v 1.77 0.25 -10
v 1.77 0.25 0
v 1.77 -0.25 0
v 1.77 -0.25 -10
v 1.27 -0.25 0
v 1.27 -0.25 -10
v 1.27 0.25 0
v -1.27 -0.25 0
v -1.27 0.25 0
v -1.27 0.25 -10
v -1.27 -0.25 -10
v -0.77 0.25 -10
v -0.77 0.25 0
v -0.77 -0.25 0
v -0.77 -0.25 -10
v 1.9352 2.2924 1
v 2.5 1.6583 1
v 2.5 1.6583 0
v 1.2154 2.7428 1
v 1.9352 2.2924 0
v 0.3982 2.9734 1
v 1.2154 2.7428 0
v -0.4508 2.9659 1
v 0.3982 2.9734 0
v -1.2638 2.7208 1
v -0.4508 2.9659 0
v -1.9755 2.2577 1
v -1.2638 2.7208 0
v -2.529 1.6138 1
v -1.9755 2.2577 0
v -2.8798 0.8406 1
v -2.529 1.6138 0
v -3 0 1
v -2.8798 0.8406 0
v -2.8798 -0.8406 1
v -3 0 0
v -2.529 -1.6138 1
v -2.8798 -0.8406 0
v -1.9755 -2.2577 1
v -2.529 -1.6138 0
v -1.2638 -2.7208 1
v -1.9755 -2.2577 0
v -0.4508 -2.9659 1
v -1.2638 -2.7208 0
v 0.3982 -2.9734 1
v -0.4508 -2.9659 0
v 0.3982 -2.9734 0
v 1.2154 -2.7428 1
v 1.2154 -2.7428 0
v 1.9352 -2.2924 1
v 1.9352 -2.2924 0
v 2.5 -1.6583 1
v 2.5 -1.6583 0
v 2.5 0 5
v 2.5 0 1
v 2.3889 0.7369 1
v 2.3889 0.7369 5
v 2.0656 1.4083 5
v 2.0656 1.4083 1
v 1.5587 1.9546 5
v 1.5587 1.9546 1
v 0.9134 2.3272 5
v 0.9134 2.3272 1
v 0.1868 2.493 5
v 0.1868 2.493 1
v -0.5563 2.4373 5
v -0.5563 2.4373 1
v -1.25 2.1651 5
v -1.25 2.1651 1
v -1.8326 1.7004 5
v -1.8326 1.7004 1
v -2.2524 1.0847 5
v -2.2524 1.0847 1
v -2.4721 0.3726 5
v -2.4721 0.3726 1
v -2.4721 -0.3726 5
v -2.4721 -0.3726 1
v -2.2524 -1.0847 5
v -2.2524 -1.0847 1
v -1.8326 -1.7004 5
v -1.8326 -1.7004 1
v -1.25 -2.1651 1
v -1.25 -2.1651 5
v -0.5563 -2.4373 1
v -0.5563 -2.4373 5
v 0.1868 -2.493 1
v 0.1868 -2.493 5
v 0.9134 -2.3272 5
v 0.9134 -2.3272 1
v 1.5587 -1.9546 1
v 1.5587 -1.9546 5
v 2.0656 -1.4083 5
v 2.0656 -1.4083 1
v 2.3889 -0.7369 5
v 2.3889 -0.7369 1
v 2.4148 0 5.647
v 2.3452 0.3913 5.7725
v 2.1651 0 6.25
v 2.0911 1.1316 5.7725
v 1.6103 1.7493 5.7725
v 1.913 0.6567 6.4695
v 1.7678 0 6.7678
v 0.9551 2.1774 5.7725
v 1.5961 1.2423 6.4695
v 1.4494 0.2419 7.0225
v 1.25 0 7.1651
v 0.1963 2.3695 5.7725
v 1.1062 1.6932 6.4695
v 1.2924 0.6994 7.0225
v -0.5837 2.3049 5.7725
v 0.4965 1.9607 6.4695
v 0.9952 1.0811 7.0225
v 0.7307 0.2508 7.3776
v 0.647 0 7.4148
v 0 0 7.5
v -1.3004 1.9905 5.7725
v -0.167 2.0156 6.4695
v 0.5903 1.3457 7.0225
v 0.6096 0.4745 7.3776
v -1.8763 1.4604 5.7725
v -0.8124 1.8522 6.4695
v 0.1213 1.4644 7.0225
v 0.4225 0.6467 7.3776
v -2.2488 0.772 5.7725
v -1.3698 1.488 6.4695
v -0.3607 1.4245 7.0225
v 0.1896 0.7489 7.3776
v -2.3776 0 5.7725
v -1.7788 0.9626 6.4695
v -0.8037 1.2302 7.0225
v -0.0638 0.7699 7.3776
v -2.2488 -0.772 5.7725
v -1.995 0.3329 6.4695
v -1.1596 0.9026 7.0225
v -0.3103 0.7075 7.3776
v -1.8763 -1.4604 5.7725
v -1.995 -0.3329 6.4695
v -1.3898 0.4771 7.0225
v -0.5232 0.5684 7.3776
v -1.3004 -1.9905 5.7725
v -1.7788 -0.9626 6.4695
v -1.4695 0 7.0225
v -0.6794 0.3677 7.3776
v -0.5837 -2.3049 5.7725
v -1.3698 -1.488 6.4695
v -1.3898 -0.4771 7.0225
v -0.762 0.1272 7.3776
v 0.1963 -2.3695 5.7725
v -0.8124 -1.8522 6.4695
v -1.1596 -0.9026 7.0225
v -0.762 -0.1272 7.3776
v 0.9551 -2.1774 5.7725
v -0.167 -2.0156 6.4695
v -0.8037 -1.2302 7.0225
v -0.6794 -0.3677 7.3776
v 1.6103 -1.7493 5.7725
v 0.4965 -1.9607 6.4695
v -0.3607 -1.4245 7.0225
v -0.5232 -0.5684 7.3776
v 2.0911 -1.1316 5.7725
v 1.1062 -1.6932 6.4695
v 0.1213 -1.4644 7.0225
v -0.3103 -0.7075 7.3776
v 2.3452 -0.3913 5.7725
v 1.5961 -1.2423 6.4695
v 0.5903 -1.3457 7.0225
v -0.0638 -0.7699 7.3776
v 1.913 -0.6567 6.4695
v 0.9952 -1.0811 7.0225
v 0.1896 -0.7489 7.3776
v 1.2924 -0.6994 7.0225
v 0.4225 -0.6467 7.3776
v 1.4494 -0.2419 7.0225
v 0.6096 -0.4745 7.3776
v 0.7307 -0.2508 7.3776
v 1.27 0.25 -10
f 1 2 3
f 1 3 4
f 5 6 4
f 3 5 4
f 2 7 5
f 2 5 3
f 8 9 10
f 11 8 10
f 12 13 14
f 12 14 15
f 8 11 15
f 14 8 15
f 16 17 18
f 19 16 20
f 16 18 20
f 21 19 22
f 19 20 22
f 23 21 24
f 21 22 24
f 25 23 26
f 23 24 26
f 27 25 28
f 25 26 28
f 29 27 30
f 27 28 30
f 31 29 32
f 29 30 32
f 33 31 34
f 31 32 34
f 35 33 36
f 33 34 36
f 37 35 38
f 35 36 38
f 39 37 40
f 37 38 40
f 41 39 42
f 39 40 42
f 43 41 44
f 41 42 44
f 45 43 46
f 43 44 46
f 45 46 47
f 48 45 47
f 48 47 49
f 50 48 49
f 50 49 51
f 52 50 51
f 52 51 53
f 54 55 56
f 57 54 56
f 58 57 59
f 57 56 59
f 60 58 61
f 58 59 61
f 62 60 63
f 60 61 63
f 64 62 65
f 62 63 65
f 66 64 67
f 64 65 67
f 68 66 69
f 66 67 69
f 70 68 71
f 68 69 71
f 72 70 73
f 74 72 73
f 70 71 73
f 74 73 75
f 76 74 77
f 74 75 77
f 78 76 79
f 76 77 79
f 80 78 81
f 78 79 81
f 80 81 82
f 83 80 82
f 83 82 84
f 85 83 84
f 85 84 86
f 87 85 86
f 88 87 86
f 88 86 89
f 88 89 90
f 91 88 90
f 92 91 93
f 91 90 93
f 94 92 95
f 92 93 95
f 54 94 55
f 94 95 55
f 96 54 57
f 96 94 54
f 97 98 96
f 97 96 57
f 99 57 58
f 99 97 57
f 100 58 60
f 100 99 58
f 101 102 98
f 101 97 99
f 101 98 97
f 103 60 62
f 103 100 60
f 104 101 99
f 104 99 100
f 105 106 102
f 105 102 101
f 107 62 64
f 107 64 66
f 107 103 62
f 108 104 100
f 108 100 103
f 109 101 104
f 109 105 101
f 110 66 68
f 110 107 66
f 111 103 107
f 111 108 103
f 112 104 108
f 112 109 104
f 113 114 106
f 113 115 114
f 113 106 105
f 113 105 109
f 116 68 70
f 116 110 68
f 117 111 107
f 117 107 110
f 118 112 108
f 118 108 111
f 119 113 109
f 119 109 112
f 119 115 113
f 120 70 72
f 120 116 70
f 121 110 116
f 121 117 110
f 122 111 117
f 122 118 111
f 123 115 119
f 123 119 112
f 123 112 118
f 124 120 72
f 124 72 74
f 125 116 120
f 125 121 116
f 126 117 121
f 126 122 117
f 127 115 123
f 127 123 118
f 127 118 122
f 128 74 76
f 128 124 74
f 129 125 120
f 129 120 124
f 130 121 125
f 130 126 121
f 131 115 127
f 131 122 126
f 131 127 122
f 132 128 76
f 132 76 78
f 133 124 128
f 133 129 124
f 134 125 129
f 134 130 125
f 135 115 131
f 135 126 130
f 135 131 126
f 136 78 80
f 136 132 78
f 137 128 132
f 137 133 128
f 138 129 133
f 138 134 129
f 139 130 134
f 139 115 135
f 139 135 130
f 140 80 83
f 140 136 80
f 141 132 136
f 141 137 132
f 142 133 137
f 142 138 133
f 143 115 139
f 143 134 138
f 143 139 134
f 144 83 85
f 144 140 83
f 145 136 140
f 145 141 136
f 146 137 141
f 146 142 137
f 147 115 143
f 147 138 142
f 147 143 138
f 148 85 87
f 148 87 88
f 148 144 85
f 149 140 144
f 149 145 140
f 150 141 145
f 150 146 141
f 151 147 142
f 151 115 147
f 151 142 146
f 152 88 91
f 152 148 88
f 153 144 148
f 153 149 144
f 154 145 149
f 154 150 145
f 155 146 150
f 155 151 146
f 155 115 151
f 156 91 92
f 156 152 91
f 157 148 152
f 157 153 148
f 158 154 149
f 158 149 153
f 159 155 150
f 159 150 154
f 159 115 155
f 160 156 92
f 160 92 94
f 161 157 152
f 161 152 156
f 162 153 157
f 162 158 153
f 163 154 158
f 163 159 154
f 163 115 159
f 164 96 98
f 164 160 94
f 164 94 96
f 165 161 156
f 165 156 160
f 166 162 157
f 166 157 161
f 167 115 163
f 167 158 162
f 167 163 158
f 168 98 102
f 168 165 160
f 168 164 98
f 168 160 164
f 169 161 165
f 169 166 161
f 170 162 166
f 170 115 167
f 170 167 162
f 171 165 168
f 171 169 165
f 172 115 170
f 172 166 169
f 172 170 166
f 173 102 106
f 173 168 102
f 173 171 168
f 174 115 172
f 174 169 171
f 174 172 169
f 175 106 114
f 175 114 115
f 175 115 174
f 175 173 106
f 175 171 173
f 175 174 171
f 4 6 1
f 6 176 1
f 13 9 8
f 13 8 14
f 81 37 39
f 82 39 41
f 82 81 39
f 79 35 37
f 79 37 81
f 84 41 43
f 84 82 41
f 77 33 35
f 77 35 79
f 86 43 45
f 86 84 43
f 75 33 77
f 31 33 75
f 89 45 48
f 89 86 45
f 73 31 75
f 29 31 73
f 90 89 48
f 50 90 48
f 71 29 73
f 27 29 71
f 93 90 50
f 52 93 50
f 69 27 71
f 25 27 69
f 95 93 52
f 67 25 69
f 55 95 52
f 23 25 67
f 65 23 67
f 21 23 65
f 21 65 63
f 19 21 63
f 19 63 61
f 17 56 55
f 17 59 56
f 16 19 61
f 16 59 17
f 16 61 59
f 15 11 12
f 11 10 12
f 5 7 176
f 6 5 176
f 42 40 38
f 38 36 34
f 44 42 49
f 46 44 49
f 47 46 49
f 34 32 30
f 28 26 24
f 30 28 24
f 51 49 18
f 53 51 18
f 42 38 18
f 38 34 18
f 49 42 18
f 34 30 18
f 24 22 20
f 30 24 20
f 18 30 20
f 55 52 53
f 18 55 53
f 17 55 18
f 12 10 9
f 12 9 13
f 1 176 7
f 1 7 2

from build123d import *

# Parameters (mm, degrees)
SKETCH1_R           = 3
BOSS_EXTRUDE1_DEPTH = 1
SKETCH2_R           = 2.5
BOSS_EXTRUDE2_DEPTH = 4
DOME1_FACE_RADIUS   = 2.5
DOME1_HEIGHT        = 2.5
CUT_EXTRUDE1_REACH  = 9.762
SKETCH3_W           = 0.5
SKETCH3_H           = 4.031292186
SKETCH8_W           = 0.5
SKETCH8_H           = 10
BASE_FLANGE1_DEPTH  = 0.25
SKETCH9_W           = 0.5
SKETCH9_H           = 10
BASE_FLANGE2_DEPTH  = 0.25


# Sheet-metal steps are written as plain solids
with BuildPart() as part:
    # Sketch1 → Boss-Extrude1 (new body)
    with BuildSketch(Plane.XY):
        Circle(SKETCH1_R)
    extrude(amount=BOSS_EXTRUDE1_DEPTH)

    # Sketch2 → Boss-Extrude2 (add)
    with BuildSketch(Plane.XY.offset(1)):
        Circle(SKETCH2_R)
    extrude(amount=BOSS_EXTRUDE2_DEPTH)

    # Dome1: a dome of height H over a round flat face of radius A is a cap of a sphere of radius (A * A + H * H) / (2 * H)
    dome1_r = (DOME1_FACE_RADIUS * DOME1_FACE_RADIUS + DOME1_HEIGHT * DOME1_HEIGHT) / (2 * DOME1_HEIGHT)
    dome1_base = Plane((0, 0, 5), z_dir=(0, 0, 1))
    with Locations(dome1_base.offset(DOME1_HEIGHT - dome1_r)):
        dome1_ball = Sphere(dome1_r, mode=Mode.PRIVATE)
    add(split(dome1_ball, bisect_by=dome1_base, keep=Keep.TOP, mode=Mode.PRIVATE))

    # Sketch3 → Cut-Extrude1 (cut, up to next)
    with BuildSketch(Plane.XY.offset(1), mode=Mode.PRIVATE) as cut_extrude1_sk1:
        with Locations((2.75, -0.165370345)):
            Rectangle(SKETCH3_W, SKETCH3_H)
    cut_extrude1_tool1 = extrude(cut_extrude1_sk1.sketch, amount=-CUT_EXTRUDE1_REACH, mode=Mode.PRIVATE) & part.part
    add(cut_extrude1_tool1.solids().sort_by_distance((2.75, -0.16537, 1))[0], mode=Mode.SUBTRACT)


with BuildPart() as body_2:
    # Sketch8 → Base-Flange1 (new, symmetric)
    with BuildSketch(Plane(origin=(0, 0, 0), x_dir=(1, 0, 0), z_dir=(0, 1, 0))):
        with Locations((-1.02, 5)):
            Rectangle(SKETCH8_W, SKETCH8_H)
    extrude(amount=BASE_FLANGE1_DEPTH, both=True)


with BuildPart() as body_3:
    # Sketch9 → Base-Flange2 (new, symmetric)
    with BuildSketch(Plane(origin=(0, 0, 0), x_dir=(1, 0, 0), z_dir=(0, 1, 0))):
        with Locations((1.52, 5)):
            Rectangle(SKETCH9_W, SKETCH9_H)
    extrude(amount=BASE_FLANGE2_DEPTH, both=True)


solid = Compound([part.part, body_2.part, body_3.part])
